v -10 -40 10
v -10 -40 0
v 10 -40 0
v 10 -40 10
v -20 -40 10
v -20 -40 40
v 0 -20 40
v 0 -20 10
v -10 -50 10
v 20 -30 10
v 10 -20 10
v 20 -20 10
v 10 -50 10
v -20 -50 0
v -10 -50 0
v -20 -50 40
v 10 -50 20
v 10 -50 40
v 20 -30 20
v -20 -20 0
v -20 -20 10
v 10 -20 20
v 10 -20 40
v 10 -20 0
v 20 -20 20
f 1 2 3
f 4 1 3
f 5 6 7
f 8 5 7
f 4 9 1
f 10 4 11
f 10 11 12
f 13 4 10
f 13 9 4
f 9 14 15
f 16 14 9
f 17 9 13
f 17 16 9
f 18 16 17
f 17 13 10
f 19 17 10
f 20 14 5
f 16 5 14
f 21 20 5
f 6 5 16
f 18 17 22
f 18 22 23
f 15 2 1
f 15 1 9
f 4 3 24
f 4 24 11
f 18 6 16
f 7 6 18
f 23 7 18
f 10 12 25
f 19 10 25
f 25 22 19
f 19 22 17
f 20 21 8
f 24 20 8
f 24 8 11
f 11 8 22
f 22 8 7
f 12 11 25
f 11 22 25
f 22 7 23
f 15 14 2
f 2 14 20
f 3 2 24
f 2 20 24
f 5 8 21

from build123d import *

# Parameters (mm, degrees)
F0_W      = 40
F0_H      = 40
F1_DEPTH  = 30
F2_W      = 10
F2_H      = 20
F2_H_2    = 10
F3_DEPTH  = 30
F4_W      = 20
F4_H      = 10
F5_DEPTH  = 10
F7_DEPTH  = 10
F9_DEPTH  = 30
F10_ANGLE = 90


with BuildPart() as f1:
    # F0 (on Top) → F1 (new body)
    with BuildSketch(Plane.XY):
        Rectangle(F0_W, F0_H)
    extrude(amount=F1_DEPTH)

    # F2 (on face) → F3 (cut)
    with BuildSketch(Plane.XY.offset(30)):
        with Locations((15, 10)):
            Rectangle(F2_W, F2_H)
        with Locations((15, -15)):
            Rectangle(F2_W, F2_H_2)
    extrude(amount=-F3_DEPTH, mode=Mode.SUBTRACT)

    # F4 (on face) → F5 (cut)
    with BuildSketch(Plane.XZ.offset(20)):
        with Locations((0, 25)):
            Rectangle(F4_W, F4_H)
    extrude(amount=-F5_DEPTH, mode=Mode.SUBTRACT)

    # F6 (on face) → F7 (cut)
    with BuildSketch(Plane.XZ.offset(10)):
        Polygon((20, 10), (20, 30), (10, 30), align=None)
    extrude(amount=-F7_DEPTH, mode=Mode.SUBTRACT)

    # F8 (on face) → F9 (cut)
    with BuildSketch(Plane(origin=(0, 20, 0), x_dir=(-1, 0, 0), z_dir=(0, 1, 0))):
        Polygon((0, 0), (20, 0), (20, 20), align=None)
    extrude(amount=-F9_DEPTH, mode=Mode.SUBTRACT)


with BuildPart() as f1_1:
    # F10: moved
    add(f1.part.rotate(Axis((-5, -20, 0), (1, 0, 0)), F10_ANGLE))


solid = f1_1.part
